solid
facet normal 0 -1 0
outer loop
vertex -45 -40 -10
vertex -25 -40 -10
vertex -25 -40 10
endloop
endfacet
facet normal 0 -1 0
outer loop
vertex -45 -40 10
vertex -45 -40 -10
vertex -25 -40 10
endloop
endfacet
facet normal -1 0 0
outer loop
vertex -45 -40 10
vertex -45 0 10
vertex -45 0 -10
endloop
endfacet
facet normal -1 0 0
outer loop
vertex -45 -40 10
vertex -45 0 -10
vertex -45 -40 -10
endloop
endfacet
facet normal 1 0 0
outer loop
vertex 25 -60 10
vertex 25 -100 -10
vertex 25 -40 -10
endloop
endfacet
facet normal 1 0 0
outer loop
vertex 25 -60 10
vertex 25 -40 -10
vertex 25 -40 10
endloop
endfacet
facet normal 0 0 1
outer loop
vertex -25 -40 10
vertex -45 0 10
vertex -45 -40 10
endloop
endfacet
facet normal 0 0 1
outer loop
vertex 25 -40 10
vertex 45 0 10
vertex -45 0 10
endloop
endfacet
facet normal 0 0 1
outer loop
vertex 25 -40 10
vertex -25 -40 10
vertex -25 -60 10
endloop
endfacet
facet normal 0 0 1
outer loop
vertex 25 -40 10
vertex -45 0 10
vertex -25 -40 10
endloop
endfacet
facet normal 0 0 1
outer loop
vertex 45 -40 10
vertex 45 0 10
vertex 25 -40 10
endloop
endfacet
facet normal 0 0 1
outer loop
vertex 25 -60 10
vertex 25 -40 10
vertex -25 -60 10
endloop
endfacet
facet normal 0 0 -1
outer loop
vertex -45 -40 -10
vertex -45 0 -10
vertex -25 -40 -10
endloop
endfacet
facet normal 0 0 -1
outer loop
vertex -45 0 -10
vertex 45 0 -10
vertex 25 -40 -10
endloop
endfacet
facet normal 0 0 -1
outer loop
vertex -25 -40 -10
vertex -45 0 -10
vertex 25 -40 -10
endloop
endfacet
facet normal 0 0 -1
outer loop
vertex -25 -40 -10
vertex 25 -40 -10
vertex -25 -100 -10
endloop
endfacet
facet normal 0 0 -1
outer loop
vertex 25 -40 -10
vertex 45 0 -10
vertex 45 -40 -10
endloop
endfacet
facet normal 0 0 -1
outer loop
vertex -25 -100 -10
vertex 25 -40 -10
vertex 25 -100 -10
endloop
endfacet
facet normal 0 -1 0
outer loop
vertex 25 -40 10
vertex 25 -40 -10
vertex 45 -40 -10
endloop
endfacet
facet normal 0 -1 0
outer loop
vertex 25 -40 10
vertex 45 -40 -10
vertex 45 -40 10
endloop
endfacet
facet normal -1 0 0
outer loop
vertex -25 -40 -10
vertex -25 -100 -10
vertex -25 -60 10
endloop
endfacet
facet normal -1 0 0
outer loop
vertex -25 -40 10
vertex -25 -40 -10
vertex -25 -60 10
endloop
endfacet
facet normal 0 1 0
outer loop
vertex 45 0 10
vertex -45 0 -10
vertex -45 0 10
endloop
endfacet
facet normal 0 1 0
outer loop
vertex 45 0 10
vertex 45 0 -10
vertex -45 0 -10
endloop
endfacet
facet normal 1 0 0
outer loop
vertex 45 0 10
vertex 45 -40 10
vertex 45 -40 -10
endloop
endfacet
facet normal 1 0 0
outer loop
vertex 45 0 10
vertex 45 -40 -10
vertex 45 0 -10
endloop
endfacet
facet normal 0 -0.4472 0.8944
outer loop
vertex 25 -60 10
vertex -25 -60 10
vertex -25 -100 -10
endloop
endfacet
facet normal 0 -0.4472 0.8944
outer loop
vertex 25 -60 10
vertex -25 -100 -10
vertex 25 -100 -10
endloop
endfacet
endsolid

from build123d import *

# Parameters (mm, degrees)
F0_W     = 50
F0_H     = 20
F1_DEPTH = 100
F2_SIZE2 = 39.99999
F2_SIZE  = 19.99999
F3_W     = 40
F3_H     = 20
F4_DEPTH = 20
F5_W     = 40
F5_H     = 20
F6_DEPTH = 20


# Not quite as in the source:
# - a fillet or chamfer is up to 0.001 mm smaller than in the source, because OpenCascade refuses the exact size


with BuildPart() as f1:
    # F0 (on Front) → F1 (new body)
    with BuildSketch(Plane.XZ):
        Rectangle(F0_W, F0_H)
    extrude(amount=F1_DEPTH)

    # F2 (size 20 and 40 in the source; OpenCascade refuses exactly that, so slightly less here)
    f2_edges = [f1.edges().sort_by_distance(p)[0] for p in [
        (0, -100, 10),
    ]]
    f2_side = f1.faces().sort_by_distance((0, -100, 0))[0]
    chamfer(f2_edges, length=F2_SIZE, length2=F2_SIZE2, reference=f2_side)

    # F3 (on face) → F4 (join)
    with BuildSketch(Plane.YZ.offset(25)):
        with Locations((-20, 0)):
            Rectangle(F3_W, F3_H)
    extrude(amount=F4_DEPTH)

    # F5 (on face) → F6 (join)
    with BuildSketch(Plane(origin=(-25, 0, 0), x_dir=(0, -1, 0), z_dir=(-1, 0, 0))):
        with Locations((20, 0)):
            Rectangle(F5_W, F5_H)
    extrude(amount=F6_DEPTH)


solid = f1.part
